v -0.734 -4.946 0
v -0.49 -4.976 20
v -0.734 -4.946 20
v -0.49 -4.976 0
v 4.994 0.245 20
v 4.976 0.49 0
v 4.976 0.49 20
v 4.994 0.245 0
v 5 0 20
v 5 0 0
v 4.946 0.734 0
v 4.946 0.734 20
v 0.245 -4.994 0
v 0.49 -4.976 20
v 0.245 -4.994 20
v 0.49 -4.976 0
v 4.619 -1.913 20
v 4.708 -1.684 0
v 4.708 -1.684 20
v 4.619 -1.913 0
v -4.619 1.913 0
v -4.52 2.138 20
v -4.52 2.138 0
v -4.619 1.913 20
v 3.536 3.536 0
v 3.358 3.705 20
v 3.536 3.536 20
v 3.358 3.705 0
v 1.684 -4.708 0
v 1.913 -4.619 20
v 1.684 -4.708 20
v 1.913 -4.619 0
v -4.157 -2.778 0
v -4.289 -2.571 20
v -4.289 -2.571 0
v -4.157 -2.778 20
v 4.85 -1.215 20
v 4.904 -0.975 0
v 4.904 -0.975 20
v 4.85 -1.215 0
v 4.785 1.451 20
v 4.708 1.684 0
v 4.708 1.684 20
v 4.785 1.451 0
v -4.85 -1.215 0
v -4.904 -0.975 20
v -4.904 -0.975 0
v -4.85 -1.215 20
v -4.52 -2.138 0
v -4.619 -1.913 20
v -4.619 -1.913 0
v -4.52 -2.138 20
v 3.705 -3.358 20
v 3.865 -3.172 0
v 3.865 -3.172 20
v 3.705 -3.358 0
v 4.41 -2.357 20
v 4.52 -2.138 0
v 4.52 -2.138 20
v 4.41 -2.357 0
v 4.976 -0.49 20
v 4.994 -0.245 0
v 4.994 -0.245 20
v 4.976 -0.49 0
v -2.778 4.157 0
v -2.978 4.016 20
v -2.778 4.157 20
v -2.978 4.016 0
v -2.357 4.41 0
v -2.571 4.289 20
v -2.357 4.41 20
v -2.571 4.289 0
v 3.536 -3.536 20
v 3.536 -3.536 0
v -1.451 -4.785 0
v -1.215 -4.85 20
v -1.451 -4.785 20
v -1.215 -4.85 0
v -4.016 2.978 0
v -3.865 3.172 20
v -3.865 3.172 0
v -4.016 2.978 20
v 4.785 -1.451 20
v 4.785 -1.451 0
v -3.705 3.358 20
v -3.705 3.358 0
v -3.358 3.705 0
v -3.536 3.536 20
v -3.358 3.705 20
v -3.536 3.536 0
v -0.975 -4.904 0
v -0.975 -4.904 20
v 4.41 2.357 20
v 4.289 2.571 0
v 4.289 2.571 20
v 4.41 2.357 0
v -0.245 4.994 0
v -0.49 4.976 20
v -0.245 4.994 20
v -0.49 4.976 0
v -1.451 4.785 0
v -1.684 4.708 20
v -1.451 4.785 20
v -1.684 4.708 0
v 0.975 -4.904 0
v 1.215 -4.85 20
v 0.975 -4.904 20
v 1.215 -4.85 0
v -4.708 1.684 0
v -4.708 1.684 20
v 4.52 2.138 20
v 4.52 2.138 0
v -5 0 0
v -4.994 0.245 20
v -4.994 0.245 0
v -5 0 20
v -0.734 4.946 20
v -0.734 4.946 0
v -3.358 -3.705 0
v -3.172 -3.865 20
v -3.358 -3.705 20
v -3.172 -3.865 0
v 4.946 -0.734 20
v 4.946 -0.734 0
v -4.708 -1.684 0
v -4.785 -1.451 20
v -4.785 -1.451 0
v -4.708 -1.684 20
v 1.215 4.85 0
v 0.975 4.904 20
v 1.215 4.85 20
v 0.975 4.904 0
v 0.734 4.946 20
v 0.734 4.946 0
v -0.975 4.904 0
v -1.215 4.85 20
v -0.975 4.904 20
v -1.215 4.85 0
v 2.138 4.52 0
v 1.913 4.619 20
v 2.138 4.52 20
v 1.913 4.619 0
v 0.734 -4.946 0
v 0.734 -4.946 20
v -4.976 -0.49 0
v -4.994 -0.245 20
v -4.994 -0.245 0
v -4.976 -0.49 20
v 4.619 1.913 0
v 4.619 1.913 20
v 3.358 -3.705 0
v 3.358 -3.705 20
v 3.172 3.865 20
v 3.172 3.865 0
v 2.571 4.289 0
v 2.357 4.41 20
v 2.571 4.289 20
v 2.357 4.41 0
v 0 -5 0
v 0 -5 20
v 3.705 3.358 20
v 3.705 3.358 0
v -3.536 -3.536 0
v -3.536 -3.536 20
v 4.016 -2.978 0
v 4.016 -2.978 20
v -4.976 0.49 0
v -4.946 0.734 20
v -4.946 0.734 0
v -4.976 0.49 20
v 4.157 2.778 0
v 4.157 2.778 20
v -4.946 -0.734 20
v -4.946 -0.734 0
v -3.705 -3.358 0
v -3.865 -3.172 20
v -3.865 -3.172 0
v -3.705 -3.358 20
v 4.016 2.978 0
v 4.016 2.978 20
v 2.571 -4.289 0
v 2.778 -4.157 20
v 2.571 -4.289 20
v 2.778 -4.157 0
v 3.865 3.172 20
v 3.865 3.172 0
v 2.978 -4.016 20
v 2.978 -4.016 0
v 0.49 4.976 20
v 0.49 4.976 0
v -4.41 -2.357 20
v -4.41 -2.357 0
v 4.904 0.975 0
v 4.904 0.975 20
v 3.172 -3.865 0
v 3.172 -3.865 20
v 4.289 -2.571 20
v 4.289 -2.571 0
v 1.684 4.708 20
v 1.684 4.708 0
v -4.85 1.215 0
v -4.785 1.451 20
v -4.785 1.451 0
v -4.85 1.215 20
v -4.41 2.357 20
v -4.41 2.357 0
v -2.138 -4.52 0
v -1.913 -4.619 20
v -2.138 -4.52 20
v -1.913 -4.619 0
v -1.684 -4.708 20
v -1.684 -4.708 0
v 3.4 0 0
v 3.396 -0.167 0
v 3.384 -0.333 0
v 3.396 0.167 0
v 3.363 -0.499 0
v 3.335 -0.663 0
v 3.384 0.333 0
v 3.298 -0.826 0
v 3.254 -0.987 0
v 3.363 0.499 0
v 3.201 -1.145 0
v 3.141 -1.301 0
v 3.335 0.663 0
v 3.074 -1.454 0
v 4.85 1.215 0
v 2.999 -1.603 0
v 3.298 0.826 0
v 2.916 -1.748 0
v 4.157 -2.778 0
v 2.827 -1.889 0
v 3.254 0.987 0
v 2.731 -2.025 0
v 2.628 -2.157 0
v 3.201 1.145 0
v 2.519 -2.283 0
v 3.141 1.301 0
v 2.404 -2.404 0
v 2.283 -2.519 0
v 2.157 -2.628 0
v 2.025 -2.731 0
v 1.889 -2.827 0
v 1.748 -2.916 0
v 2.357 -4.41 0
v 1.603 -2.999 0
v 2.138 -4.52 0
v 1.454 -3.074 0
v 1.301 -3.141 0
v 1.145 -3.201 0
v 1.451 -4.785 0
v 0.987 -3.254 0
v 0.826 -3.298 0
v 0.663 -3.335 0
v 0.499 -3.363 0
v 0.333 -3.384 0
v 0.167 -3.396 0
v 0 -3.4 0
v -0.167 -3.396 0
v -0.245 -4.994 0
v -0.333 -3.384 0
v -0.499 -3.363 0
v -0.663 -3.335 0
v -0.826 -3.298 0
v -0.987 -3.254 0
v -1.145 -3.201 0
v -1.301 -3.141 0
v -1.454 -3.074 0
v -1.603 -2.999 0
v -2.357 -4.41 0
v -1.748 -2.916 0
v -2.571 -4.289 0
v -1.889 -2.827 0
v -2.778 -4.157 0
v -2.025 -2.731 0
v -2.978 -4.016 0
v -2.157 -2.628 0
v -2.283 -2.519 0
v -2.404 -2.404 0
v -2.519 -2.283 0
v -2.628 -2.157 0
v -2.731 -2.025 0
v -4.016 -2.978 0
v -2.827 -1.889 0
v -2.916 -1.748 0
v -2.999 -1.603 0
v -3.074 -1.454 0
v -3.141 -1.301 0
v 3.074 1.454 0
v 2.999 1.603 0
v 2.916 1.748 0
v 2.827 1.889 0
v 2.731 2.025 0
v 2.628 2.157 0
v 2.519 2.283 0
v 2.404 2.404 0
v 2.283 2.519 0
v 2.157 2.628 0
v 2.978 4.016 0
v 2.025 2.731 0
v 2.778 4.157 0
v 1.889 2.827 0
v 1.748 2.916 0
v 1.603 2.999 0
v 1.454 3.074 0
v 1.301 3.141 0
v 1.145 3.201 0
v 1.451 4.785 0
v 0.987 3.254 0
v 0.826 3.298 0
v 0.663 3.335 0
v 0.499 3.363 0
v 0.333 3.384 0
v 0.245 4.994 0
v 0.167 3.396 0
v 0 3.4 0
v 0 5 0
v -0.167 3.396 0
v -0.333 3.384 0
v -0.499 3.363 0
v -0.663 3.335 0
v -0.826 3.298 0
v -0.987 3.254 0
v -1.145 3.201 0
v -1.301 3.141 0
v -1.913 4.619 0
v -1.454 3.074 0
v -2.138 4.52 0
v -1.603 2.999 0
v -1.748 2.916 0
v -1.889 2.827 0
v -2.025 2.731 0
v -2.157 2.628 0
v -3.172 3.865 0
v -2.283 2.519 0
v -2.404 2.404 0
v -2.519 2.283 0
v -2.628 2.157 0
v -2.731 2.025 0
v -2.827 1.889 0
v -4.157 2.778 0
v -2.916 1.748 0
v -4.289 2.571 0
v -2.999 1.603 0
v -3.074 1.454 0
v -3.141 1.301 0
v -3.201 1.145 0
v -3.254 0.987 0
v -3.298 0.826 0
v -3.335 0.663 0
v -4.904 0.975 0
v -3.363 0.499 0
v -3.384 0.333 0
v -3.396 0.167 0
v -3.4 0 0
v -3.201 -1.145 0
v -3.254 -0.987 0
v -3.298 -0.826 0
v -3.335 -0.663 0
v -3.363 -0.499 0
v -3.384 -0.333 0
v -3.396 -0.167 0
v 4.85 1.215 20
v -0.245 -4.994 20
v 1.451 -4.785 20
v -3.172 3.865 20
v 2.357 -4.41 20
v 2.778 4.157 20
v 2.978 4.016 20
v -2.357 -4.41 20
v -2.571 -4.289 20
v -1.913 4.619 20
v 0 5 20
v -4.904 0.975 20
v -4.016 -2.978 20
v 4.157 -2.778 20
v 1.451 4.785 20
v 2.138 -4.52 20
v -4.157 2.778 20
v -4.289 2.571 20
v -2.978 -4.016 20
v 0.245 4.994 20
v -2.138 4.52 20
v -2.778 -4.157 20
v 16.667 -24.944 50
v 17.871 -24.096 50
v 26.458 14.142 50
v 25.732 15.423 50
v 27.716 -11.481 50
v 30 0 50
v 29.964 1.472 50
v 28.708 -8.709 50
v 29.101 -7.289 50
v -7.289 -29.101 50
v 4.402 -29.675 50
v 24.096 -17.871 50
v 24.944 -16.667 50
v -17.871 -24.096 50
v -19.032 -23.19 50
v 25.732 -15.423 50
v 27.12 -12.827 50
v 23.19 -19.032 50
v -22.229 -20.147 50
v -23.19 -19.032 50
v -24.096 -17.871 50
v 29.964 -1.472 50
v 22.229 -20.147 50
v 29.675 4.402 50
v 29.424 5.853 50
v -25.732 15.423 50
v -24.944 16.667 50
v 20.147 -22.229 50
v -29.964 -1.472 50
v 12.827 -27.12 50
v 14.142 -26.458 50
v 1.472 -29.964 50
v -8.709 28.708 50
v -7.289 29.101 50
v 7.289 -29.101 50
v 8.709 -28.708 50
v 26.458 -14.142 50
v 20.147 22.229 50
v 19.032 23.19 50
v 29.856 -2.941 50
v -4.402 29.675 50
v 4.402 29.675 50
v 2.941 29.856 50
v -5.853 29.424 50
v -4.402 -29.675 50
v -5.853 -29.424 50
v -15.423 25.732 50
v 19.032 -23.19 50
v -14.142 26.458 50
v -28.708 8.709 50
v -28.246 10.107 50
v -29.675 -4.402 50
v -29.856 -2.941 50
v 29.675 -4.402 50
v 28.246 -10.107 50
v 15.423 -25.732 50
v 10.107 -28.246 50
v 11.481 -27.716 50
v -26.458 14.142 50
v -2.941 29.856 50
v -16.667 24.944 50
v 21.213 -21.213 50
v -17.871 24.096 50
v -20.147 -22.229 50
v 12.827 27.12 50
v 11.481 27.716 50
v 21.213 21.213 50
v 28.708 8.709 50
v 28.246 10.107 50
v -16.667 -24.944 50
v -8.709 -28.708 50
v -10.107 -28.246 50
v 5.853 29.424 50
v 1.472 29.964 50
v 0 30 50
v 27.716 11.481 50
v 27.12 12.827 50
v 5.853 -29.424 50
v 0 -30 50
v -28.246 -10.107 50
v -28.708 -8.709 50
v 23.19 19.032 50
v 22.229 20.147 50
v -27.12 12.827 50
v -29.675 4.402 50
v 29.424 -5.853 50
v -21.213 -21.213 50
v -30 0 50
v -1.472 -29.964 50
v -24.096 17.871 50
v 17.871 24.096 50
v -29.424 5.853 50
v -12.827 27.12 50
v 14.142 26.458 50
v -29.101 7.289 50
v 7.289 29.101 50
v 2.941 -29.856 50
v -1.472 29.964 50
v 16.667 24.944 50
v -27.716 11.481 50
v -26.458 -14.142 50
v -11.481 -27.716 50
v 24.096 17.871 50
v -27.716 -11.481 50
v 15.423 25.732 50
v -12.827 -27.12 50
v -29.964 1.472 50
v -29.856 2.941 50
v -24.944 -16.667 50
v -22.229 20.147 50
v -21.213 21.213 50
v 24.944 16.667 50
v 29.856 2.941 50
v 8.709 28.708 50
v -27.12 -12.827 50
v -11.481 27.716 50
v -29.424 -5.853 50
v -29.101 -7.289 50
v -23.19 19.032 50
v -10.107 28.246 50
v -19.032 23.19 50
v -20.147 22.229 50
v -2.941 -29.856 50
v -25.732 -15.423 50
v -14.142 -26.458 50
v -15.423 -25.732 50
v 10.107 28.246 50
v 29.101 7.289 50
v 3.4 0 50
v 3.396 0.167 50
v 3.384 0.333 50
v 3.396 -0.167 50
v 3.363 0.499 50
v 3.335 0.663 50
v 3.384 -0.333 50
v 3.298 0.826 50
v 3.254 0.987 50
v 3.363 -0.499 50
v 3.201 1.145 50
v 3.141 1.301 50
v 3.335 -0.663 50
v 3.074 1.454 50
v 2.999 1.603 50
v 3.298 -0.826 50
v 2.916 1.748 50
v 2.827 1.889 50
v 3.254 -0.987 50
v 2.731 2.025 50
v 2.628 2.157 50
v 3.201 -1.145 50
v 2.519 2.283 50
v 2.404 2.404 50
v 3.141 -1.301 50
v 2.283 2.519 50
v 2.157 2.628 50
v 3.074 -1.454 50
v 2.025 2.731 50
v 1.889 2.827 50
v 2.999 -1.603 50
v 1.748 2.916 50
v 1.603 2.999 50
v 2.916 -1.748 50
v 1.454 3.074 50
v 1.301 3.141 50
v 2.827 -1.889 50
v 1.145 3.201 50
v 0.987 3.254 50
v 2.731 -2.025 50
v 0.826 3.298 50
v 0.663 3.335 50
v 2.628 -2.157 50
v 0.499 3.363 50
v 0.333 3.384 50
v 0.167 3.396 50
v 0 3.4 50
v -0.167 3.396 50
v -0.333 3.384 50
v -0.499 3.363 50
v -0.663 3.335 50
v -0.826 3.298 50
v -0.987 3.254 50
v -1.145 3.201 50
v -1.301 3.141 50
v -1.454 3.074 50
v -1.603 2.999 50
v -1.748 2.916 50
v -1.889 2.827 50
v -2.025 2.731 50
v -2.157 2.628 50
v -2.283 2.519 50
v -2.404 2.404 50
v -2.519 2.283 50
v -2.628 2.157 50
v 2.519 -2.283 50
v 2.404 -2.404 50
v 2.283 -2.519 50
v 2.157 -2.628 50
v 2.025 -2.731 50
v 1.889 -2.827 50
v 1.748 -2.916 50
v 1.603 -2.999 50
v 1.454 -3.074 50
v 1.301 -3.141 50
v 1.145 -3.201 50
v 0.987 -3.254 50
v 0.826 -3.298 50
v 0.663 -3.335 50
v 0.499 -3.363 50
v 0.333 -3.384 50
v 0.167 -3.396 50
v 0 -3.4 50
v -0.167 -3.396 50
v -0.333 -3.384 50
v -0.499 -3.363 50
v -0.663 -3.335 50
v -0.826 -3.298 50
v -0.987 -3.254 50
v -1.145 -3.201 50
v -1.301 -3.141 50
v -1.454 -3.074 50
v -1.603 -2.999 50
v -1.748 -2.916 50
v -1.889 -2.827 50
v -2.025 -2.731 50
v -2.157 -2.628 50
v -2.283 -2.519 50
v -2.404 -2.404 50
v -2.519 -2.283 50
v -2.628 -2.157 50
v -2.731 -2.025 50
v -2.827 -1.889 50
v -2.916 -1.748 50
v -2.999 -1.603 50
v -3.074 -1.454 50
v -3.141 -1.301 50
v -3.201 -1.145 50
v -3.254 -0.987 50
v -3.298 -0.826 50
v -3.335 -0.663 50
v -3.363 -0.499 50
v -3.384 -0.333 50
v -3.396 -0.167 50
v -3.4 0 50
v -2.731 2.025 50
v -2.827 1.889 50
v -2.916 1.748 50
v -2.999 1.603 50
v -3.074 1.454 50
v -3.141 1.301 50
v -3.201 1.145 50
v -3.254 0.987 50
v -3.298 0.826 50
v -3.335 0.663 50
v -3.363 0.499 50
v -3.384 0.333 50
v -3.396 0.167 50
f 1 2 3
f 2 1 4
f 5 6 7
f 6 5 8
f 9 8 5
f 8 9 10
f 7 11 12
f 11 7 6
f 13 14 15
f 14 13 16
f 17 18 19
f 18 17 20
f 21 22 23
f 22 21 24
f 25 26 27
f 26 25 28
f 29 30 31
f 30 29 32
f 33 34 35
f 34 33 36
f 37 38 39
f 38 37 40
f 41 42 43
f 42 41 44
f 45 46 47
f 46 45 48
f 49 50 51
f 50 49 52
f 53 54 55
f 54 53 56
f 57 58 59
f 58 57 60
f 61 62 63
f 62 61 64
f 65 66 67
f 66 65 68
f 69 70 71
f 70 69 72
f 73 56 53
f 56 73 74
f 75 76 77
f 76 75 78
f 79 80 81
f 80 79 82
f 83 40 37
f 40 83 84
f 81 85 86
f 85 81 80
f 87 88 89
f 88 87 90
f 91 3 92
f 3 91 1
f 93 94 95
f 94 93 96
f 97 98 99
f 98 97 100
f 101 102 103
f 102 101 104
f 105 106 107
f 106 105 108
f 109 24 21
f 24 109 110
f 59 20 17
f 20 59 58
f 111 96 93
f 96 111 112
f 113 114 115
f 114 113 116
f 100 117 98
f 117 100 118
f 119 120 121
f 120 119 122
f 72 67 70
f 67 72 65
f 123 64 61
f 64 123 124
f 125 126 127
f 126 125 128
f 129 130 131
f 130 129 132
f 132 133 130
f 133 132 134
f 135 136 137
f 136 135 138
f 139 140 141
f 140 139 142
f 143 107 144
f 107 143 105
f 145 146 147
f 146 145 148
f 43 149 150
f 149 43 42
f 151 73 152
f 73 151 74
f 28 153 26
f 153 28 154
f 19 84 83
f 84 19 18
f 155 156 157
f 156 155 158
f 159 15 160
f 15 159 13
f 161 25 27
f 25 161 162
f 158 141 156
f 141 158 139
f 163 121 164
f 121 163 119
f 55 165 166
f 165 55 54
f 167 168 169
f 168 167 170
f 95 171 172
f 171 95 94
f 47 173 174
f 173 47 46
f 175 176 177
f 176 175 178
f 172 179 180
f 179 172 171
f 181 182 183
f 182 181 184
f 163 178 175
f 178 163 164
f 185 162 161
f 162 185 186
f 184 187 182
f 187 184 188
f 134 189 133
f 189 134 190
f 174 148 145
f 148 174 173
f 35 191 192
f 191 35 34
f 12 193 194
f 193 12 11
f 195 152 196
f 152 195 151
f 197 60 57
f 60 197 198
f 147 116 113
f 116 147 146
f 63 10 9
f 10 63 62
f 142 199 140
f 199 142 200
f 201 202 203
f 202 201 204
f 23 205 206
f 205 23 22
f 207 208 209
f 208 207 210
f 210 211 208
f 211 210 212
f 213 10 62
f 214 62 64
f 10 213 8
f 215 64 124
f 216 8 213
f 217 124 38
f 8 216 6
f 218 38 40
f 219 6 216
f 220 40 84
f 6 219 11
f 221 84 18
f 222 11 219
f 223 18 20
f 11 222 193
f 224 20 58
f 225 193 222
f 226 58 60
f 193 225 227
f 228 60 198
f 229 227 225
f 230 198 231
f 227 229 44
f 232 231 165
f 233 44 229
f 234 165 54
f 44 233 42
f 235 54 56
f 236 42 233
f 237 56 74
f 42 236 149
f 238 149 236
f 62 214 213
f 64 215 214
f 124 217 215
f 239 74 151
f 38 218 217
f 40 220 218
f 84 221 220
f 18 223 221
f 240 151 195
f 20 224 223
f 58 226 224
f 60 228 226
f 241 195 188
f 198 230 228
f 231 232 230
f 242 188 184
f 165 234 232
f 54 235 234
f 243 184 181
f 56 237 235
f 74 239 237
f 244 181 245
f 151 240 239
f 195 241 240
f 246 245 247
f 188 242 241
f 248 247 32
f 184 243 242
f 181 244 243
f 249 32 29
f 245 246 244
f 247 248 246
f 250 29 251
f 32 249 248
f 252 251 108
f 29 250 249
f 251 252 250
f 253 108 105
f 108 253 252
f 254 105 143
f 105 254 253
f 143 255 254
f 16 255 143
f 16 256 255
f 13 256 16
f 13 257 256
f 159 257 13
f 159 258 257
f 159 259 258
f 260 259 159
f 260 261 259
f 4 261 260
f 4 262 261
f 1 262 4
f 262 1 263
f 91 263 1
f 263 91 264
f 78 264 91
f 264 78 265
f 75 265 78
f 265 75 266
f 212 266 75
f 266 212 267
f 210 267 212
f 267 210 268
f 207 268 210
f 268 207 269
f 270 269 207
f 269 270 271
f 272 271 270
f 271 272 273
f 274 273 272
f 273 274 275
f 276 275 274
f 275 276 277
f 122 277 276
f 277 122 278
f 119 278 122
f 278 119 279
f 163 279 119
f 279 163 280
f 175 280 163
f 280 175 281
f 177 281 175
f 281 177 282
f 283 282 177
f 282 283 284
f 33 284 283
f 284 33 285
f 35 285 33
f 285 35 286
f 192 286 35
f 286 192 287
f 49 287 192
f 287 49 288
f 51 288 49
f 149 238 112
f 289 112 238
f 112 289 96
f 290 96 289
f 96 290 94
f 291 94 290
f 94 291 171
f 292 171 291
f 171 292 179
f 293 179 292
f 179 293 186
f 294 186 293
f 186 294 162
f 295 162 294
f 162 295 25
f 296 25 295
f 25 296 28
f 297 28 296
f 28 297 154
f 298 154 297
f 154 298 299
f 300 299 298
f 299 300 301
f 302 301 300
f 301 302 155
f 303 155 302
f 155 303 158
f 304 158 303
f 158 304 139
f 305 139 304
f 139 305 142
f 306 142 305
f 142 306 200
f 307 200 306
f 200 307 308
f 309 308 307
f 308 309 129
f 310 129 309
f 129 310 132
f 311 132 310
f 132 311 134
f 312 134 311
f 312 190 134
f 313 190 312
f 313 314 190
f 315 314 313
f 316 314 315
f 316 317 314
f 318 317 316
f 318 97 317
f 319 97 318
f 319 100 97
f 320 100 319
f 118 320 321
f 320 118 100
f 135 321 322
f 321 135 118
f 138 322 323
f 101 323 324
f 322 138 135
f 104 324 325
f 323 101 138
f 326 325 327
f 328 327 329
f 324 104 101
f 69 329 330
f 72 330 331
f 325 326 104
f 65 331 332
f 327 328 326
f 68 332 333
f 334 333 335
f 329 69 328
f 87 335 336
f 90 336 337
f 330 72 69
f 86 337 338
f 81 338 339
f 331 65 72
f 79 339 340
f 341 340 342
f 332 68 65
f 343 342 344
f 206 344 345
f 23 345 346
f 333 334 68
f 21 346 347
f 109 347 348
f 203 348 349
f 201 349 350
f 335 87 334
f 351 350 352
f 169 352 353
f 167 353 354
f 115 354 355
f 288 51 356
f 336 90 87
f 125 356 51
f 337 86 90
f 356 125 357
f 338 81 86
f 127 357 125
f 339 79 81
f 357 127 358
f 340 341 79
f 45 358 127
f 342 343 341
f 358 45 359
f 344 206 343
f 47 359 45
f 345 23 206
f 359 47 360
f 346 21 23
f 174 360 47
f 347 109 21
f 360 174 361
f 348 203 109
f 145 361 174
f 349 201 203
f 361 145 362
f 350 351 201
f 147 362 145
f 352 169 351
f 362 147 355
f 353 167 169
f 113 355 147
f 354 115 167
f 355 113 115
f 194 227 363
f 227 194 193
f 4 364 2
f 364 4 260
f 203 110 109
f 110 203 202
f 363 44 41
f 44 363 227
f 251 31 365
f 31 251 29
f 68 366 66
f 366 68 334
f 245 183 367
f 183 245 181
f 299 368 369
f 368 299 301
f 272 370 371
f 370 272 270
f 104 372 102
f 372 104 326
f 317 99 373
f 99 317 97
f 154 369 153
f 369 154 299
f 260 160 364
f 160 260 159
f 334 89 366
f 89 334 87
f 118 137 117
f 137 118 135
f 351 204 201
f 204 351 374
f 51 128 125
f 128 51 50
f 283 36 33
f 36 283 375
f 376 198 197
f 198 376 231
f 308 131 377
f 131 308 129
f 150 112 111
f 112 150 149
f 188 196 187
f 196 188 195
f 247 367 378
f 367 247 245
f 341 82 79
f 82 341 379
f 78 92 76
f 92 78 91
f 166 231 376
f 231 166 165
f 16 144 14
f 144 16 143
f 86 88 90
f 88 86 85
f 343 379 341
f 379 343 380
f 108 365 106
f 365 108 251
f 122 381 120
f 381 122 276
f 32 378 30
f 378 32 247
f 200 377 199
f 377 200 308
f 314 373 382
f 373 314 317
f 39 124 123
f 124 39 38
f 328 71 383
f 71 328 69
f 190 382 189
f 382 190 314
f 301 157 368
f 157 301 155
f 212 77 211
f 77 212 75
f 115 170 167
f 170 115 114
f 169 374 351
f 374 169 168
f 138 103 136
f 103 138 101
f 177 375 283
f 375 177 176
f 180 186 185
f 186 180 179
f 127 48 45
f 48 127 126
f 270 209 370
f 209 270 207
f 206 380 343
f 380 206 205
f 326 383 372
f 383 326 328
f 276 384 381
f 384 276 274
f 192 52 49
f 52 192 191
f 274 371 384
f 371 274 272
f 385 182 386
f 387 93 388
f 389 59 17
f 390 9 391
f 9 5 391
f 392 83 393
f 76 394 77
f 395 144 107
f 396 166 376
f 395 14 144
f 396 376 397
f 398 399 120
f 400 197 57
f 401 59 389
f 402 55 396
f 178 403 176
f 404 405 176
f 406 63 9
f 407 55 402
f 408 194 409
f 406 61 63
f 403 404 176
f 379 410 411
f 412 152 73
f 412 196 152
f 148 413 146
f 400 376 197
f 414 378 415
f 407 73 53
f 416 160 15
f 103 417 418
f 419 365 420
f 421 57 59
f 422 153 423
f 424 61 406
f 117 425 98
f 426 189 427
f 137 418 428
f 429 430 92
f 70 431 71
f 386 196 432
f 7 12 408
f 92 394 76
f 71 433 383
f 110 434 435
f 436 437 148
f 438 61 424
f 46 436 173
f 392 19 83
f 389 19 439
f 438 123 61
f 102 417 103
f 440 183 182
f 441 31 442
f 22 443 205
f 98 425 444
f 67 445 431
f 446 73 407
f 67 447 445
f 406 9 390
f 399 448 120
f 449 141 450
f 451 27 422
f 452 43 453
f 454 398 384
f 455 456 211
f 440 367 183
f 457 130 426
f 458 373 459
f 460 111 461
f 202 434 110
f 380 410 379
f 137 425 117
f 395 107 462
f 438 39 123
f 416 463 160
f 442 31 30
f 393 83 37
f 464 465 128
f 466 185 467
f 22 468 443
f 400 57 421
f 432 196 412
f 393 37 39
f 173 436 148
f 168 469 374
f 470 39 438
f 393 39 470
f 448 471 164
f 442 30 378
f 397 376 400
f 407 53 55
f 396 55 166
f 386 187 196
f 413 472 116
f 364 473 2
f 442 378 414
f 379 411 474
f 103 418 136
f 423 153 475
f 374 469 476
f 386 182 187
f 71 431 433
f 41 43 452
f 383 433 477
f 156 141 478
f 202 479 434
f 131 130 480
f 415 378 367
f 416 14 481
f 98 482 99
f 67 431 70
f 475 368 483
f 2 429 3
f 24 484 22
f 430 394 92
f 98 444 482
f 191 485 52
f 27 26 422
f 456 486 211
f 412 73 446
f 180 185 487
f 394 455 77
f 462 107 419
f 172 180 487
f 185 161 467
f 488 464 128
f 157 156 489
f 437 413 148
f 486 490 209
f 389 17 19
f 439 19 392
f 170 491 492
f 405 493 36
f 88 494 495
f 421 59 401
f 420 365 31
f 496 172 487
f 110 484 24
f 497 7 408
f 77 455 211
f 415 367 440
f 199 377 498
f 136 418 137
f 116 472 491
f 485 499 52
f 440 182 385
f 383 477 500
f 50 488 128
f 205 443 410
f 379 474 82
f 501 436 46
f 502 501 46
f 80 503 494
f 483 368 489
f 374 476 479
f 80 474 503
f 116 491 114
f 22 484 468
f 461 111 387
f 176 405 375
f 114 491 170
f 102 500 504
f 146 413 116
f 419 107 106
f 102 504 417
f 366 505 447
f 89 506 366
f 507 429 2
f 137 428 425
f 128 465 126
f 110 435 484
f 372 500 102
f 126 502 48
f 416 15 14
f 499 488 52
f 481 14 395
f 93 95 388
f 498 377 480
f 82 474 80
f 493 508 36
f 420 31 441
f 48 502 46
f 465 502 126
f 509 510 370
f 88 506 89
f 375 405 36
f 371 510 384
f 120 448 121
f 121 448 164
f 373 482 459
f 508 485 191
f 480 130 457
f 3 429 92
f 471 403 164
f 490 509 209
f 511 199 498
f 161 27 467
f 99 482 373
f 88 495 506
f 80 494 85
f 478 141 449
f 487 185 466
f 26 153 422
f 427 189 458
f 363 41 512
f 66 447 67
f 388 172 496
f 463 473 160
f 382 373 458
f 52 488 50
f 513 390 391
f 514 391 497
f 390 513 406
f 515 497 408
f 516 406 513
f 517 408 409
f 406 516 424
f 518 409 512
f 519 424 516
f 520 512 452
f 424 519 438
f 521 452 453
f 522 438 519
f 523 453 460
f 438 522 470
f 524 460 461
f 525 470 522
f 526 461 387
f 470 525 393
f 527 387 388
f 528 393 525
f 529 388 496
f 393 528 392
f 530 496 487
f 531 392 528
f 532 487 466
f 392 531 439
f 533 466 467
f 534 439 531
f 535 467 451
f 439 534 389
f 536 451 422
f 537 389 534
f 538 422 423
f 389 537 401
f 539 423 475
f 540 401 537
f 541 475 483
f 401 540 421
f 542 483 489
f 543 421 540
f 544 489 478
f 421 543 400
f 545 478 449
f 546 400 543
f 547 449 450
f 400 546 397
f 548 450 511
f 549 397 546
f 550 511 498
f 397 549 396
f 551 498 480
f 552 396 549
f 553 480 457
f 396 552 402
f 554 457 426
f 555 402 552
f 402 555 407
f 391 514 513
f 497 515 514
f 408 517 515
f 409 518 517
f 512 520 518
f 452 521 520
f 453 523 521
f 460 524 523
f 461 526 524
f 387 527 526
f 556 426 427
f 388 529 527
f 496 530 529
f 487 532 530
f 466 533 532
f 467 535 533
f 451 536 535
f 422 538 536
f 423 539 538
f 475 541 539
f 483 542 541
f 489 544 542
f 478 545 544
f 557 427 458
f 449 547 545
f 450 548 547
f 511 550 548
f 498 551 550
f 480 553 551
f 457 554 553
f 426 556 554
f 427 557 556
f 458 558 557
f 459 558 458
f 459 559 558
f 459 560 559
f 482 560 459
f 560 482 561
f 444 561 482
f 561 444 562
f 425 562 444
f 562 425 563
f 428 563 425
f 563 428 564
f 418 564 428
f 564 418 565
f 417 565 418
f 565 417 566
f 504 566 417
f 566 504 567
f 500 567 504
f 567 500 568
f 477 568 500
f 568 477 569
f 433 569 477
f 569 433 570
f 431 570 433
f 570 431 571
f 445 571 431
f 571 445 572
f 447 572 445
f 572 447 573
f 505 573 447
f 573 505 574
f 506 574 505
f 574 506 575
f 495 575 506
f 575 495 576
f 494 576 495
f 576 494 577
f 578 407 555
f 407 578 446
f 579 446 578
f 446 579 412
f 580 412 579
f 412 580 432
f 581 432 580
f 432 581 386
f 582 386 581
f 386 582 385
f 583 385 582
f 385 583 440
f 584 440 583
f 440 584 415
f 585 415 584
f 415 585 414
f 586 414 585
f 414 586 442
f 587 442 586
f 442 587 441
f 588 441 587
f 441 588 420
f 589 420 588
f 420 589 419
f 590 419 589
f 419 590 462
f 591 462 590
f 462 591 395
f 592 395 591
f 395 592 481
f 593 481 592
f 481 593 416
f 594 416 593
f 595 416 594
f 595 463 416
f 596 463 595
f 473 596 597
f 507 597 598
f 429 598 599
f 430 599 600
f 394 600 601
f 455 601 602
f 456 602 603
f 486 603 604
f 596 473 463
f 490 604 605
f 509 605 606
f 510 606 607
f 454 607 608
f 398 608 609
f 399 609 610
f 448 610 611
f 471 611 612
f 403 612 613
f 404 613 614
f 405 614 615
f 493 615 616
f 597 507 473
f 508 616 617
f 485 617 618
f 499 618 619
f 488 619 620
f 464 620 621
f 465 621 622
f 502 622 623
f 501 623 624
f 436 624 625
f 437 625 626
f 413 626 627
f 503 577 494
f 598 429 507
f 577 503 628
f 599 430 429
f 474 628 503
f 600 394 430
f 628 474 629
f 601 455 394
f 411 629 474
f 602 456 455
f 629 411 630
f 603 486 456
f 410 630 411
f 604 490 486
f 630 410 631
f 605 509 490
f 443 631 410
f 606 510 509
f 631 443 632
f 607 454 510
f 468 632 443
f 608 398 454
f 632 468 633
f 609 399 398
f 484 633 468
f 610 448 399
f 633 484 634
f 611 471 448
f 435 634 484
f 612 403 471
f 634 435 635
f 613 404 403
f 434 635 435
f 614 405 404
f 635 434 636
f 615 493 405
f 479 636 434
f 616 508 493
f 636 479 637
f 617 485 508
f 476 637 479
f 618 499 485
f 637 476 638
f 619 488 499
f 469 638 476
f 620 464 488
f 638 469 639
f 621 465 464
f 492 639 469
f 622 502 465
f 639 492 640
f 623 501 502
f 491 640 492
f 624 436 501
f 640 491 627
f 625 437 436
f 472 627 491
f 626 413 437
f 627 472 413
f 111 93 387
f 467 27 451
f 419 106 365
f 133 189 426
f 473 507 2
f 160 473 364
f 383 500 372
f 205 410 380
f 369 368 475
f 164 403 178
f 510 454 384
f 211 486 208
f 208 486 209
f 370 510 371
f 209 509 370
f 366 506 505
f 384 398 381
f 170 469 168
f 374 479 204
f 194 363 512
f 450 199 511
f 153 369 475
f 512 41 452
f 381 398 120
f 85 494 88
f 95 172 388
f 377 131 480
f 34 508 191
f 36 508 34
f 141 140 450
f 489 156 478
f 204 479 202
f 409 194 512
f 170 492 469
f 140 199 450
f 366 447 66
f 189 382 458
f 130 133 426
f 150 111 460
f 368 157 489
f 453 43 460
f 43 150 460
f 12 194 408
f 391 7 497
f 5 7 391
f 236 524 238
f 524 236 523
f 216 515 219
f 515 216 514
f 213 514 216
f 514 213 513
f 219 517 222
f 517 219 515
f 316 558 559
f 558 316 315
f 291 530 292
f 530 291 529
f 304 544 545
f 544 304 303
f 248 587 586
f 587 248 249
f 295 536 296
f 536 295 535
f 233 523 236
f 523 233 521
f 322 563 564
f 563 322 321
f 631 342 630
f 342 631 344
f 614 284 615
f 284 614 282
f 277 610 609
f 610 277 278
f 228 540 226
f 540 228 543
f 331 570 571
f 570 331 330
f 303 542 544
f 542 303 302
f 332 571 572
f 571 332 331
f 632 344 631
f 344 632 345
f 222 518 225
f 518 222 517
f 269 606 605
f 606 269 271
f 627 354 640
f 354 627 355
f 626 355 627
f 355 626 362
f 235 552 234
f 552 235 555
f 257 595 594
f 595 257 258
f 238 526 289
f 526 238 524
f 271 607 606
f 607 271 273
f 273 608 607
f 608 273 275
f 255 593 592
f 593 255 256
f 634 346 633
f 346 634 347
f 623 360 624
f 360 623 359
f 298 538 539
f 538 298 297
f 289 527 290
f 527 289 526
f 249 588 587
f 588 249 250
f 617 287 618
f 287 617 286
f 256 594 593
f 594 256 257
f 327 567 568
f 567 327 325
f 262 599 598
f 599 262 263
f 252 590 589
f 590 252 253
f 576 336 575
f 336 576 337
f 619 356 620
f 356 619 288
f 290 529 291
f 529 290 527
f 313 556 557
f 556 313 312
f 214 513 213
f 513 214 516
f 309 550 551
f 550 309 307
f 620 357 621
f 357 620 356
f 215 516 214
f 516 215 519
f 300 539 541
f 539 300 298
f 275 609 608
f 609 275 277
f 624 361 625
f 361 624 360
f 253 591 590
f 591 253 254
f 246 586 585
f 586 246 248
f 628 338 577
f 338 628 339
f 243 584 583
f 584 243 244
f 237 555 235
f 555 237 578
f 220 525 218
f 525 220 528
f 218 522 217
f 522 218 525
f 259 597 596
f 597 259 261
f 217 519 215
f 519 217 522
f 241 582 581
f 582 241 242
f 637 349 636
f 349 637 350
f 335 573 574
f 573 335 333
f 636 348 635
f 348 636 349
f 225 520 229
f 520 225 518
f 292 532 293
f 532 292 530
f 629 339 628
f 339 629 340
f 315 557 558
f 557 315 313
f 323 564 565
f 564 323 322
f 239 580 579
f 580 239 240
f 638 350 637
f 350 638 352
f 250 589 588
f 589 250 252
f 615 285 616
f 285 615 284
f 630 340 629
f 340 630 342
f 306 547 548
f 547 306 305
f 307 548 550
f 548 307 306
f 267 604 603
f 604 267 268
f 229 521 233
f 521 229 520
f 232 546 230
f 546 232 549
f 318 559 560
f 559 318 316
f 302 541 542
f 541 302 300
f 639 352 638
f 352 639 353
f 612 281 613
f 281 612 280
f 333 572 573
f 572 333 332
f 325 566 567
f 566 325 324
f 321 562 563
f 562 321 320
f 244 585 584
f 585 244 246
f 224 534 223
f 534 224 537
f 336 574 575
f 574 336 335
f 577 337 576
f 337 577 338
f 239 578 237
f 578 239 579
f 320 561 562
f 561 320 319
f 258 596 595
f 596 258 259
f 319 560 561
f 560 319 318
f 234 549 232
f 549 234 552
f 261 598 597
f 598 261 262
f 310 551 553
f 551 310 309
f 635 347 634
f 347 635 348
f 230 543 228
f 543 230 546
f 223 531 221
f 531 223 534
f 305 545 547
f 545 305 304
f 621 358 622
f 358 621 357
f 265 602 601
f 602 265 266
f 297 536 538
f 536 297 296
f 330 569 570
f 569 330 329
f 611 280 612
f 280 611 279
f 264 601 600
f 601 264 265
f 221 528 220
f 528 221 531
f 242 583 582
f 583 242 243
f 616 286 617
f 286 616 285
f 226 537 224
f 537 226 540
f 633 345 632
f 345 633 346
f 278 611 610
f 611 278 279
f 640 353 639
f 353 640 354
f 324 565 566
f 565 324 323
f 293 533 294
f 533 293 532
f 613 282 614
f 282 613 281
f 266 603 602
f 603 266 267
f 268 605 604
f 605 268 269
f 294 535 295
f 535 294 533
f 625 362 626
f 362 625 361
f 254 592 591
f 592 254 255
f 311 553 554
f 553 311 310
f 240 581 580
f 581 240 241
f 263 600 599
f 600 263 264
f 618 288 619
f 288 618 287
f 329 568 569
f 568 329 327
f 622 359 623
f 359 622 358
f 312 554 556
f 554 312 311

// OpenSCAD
// Small lab funnel, printed upright (wide opening at top)
// All dimensions in mm

// ---- Parameters ----
spout_od      = 10;    // spout outer diameter
spout_len     = 20;    // spout length (z = 0 to 20)
cone_bottom_d = 10;    // cone outer diameter at z = 20
cone_top_d    = 60;    // cone outer diameter at rim (z = 50)
rim_z         = 50;    // rim height
wall          = 1.6;   // wall thickness everywhere

eps = 0.5;             // overshoot for clean boolean cuts
$fn = 128;             // smoothness of curved surfaces

// ---- Derived ----
spout_id = spout_od - 2 * wall;   // spout bore = 6.8 mm
cone_h   = rim_z - spout_len;     // cone height = 30 mm

// ---- Model ----
difference() {
    union() {
        // Spout (cylinder) from z = 0 to z = 20
        translate([0, 0, 0])
            cylinder(d = spout_od, h = spout_len);

        // Cone from z = 20 to z = 50
        translate([0, 0, spout_len])
            cylinder(d1 = cone_bottom_d, d2 = cone_top_d, h = cone_h);
    }

    // Through-bore: starts inside spout wall, runs straight through cone
    translate([0, 0, -eps])
        cylinder(d = spout_id, h = rim_z + 2 * eps);
}
